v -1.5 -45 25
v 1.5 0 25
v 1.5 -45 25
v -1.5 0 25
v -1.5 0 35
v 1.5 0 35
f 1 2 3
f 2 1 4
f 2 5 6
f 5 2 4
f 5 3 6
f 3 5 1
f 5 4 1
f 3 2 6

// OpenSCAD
$fn = 30;
module prism(l, w, h){
    polyhedron(
        points=[[0,0,0], [l,0,0], [l,w,0], [0,w,0], [0,w,h], [l,w,h]],
        faces=[[0,1,2,3],[5,4,3,2],[0,4,5,1],[0,3,4],[5,2,1]]
    );
}

    
union() {
    %cylinder(r1 = 17, r2 = 0, h = 60);
    translate([ 0, -45, 0]) {
        translate([-1.5, 0, 0]) {
            %cube([3, 45, 25], center = false);
        }
        translate([ -1.5, 0, 25]) {
            prism( 3, 45, 10);
        }
    }
}

    
